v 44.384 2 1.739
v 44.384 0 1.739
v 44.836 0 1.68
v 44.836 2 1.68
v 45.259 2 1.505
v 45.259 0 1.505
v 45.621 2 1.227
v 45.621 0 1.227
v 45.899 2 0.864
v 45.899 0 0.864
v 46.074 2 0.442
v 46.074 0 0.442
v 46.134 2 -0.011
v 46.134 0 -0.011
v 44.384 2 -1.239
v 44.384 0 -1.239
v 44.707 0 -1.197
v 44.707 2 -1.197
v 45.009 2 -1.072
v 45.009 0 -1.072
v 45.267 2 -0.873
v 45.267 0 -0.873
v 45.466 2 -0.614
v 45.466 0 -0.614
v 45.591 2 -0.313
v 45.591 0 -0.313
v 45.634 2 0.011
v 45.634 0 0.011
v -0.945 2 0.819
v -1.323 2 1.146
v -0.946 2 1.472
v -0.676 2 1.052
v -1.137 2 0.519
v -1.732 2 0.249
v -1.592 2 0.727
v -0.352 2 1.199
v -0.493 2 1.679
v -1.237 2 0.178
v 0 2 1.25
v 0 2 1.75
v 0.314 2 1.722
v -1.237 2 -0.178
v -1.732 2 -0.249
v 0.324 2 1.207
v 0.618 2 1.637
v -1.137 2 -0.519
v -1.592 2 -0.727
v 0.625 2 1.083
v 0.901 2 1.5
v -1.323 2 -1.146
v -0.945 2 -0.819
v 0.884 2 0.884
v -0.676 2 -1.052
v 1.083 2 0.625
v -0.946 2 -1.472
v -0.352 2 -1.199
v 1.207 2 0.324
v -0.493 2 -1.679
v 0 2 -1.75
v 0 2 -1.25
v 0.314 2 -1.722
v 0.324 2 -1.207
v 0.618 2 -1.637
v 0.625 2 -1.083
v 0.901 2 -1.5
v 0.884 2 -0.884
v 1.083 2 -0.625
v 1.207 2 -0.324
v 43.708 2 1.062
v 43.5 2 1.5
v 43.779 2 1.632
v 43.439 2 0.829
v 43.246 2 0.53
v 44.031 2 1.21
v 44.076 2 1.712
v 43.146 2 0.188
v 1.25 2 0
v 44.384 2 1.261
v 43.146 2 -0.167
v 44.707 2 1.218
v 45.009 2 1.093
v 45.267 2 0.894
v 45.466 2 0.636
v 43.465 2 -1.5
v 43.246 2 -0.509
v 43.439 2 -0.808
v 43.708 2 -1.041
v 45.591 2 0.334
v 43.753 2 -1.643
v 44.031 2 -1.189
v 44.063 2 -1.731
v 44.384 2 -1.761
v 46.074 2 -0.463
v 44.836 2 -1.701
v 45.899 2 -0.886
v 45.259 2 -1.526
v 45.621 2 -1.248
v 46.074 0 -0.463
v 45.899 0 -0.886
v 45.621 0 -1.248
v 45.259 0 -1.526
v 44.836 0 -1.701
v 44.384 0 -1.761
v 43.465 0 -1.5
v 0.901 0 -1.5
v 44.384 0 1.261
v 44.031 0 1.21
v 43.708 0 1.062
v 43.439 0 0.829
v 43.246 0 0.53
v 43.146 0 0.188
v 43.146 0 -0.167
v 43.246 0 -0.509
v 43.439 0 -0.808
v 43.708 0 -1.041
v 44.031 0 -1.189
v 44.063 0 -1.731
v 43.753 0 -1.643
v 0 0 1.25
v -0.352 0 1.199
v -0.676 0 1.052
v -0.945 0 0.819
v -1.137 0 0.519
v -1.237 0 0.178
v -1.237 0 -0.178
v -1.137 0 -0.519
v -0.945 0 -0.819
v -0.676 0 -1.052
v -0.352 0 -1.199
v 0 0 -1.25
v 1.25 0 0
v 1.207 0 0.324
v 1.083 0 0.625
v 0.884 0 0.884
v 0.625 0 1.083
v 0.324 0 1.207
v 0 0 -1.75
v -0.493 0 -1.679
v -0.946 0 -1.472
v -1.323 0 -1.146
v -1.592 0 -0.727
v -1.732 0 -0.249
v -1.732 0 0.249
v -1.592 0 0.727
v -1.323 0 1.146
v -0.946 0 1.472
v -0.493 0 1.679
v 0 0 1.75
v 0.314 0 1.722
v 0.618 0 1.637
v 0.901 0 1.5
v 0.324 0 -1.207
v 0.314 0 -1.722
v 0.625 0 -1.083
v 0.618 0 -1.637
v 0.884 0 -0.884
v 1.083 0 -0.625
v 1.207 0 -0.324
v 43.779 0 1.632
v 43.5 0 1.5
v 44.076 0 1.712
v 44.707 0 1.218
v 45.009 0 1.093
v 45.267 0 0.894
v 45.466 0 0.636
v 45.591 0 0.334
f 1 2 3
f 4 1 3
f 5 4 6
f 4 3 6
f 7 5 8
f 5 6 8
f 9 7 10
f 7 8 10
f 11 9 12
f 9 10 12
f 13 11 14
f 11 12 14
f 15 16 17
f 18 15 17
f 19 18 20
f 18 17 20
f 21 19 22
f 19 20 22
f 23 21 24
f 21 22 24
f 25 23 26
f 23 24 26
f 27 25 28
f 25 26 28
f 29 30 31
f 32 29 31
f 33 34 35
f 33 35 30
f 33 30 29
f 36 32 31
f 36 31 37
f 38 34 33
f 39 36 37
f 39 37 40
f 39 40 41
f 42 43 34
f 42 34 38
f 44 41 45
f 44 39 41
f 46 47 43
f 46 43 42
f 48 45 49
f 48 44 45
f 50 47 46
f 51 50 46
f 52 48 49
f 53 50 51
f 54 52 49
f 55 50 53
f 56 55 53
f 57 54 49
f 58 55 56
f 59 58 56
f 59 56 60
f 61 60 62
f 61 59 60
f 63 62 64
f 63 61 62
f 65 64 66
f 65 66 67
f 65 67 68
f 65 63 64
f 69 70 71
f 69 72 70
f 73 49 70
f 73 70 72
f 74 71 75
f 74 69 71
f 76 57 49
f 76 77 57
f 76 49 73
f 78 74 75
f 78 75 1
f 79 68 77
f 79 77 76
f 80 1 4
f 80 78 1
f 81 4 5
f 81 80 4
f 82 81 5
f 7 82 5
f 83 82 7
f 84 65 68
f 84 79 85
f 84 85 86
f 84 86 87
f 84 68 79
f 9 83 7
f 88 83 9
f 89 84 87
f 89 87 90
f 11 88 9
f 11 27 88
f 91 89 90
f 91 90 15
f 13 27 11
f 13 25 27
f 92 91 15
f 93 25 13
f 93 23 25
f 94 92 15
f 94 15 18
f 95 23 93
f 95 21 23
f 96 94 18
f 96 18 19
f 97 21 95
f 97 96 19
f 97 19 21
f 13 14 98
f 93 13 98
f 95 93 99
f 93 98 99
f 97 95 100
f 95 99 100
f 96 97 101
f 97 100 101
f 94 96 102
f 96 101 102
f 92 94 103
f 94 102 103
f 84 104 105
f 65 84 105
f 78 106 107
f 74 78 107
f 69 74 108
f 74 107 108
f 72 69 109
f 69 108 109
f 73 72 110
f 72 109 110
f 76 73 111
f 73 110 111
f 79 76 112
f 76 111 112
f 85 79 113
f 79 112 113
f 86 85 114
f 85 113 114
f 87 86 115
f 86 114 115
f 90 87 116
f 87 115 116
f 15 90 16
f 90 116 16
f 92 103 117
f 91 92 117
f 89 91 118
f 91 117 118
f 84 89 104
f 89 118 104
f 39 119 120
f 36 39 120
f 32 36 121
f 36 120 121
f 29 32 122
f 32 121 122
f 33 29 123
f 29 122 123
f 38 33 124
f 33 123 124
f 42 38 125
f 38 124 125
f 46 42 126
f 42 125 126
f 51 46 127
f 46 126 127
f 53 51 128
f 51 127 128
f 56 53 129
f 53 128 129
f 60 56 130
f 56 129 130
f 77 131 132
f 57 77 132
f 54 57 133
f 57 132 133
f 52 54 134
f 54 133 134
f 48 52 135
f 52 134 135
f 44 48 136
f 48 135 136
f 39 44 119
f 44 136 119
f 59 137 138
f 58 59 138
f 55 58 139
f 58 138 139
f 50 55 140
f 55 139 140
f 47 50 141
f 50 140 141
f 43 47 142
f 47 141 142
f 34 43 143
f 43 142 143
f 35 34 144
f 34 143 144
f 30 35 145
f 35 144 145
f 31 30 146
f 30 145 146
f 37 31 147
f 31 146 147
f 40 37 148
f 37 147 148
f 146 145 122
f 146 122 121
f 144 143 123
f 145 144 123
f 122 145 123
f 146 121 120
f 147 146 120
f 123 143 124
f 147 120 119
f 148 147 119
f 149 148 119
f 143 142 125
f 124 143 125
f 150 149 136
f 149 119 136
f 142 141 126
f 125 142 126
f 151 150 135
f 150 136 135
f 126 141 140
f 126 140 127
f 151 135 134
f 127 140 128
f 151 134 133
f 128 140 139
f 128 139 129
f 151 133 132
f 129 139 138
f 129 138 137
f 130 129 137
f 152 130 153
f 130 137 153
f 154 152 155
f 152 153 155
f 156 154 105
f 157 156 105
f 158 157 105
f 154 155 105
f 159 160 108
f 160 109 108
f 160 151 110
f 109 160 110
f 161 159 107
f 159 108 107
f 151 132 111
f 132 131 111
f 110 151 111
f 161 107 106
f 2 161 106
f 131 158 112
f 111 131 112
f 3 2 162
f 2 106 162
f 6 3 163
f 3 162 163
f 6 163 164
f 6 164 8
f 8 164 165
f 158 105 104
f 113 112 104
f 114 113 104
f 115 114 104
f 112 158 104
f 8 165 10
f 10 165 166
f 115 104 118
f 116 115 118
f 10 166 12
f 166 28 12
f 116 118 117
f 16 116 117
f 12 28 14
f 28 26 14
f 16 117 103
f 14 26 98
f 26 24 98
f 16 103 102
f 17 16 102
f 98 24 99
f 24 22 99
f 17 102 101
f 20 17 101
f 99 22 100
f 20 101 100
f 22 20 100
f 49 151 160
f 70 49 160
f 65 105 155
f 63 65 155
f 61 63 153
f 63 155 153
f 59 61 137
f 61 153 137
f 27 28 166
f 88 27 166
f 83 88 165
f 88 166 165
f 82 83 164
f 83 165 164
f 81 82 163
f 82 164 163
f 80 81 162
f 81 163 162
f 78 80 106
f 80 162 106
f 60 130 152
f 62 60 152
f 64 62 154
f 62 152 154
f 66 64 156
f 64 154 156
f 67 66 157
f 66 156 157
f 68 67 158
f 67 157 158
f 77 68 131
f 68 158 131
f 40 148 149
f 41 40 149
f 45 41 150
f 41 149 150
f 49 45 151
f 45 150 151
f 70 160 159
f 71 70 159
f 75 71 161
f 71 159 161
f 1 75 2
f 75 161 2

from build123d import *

# Parameters (mm, degrees)
BOSS_EXTRUDE1_DEPTH = 2


with BuildPart() as part:
    # Sketch2 → Boss-Extrude1 (new body)
    with BuildSketch(Plane(origin=(0, 0, 0), x_dir=(1, 0, 0), z_dir=(0, 1, 0))):
        with BuildLine():
            Line((43.464851994, 1.5), (0.901387819, 1.5))
            ThreePointArc((0.901387819, 1.5), (1.523142916, 0.861705088), (1.75, 0))
            ThreePointArc((1.75, 0), (1.523142916, -0.861705088), (0.901387819, -1.5))
            Line((0.901387819, -1.5), (43.499845541, -1.5))
            ThreePointArc((43.499845541, -1.5), (42.633624493, -0.009899958), (43.464851994, 1.5))
        make_face()
        with BuildLine():
            Line((0.901387819, 1.5), (0, 1.5))
            Line((0, 1.5), (0, 1.25))
            ThreePointArc((0, 1.25), (0.883883476, 0.883883476), (1.25, 0))
            ThreePointArc((1.25, 0), (0.883883476, -0.883883476), (0, -1.25))
            Line((0, -1.25), (0, -1.5))
            Line((0, -1.5), (0.901387819, -1.5))
            ThreePointArc((0.901387819, -1.5), (1.523142916, -0.861705088), (1.75, 0))
            ThreePointArc((1.75, 0), (1.523142916, 0.861705088), (0.901387819, 1.5))
        make_face()
        with BuildLine():
            Line((0, 1.5), (0, 1.75))
            ThreePointArc((0, 1.75), (-1.75, 0), (0, -1.75))
            Line((0, -1.75), (0, -1.5))
            Line((0, -1.5), (0, -1.25))
            ThreePointArc((0, -1.25), (-1.25, 0), (0, 1.25))
            Line((0, 1.25), (0, 1.5))
        make_face()
        with BuildLine():
            Line((44.383505452, 1.760511556), (44.383505452, 1.5))
            Line((44.383505452, 1.5), (44.383505452, 1.239488444))
            ThreePointArc((44.383505452, 1.239488444), (45.267388929, 0.87337192), (45.633505452, -0.010511556))
            ThreePointArc((45.633505452, -0.010511556), (45.267388929, -0.894395033), (44.383505452, -1.260511556))
            Line((44.383505452, -1.260511556), (44.383505452, -1.5))
            Line((44.383505452, -1.5), (44.383505452, -1.739488444))
            ThreePointArc((44.383505452, -1.739488444), (45.620942319, -1.226925311), (46.133505452, 0.010511556))
            ThreePointArc((46.133505452, 0.010511556), (45.620942319, 1.247948423), (44.383505452, 1.760511556))
        make_face()
        with BuildLine():
            Line((44.383505452, 1.5), (43.464851994, 1.5))
            ThreePointArc((43.464851994, 1.5), (42.633624493, -0.009899958), (43.499845541, -1.5))
            Line((43.499845541, -1.5), (44.383505452, -1.5))
            Line((44.383505452, -1.5), (44.383505452, -1.260511556))
            ThreePointArc((44.383505452, -1.260511556), (43.133505452, -0.010511556), (44.383505452, 1.239488444))
            Line((44.383505452, 1.239488444), (44.383505452, 1.5))
        make_face()
        with BuildLine():
            ThreePointArc((0.901387819, 1.5), (0.467707173, 1.686342195), (0, 1.75))
            Line((0, 1.75), (0, 1.5))
            Line((0, 1.5), (0.901387819, 1.5))
        make_face()
        with BuildLine():
            Line((0, -1.5), (0, -1.75))
            ThreePointArc((0, -1.75), (0.467707173, -1.686342195), (0.901387819, -1.5))
            Line((0.901387819, -1.5), (0, -1.5))
        make_face()
        with BuildLine():
            ThreePointArc((44.383505452, 1.760511556), (43.906066857, 1.694124454), (43.464851994, 1.5))
            Line((43.464851994, 1.5), (44.383505452, 1.5))
            Line((44.383505452, 1.5), (44.383505452, 1.760511556))
        make_face()
        with BuildLine():
            Line((44.383505452, -1.5), (43.499845541, -1.5))
            ThreePointArc((43.499845541, -1.5), (43.925736528, -1.678555527), (44.383505452, -1.739488444))
            Line((44.383505452, -1.739488444), (44.383505452, -1.5))
        make_face()
    extrude(amount=BOSS_EXTRUDE1_DEPTH)


solid = part.part
